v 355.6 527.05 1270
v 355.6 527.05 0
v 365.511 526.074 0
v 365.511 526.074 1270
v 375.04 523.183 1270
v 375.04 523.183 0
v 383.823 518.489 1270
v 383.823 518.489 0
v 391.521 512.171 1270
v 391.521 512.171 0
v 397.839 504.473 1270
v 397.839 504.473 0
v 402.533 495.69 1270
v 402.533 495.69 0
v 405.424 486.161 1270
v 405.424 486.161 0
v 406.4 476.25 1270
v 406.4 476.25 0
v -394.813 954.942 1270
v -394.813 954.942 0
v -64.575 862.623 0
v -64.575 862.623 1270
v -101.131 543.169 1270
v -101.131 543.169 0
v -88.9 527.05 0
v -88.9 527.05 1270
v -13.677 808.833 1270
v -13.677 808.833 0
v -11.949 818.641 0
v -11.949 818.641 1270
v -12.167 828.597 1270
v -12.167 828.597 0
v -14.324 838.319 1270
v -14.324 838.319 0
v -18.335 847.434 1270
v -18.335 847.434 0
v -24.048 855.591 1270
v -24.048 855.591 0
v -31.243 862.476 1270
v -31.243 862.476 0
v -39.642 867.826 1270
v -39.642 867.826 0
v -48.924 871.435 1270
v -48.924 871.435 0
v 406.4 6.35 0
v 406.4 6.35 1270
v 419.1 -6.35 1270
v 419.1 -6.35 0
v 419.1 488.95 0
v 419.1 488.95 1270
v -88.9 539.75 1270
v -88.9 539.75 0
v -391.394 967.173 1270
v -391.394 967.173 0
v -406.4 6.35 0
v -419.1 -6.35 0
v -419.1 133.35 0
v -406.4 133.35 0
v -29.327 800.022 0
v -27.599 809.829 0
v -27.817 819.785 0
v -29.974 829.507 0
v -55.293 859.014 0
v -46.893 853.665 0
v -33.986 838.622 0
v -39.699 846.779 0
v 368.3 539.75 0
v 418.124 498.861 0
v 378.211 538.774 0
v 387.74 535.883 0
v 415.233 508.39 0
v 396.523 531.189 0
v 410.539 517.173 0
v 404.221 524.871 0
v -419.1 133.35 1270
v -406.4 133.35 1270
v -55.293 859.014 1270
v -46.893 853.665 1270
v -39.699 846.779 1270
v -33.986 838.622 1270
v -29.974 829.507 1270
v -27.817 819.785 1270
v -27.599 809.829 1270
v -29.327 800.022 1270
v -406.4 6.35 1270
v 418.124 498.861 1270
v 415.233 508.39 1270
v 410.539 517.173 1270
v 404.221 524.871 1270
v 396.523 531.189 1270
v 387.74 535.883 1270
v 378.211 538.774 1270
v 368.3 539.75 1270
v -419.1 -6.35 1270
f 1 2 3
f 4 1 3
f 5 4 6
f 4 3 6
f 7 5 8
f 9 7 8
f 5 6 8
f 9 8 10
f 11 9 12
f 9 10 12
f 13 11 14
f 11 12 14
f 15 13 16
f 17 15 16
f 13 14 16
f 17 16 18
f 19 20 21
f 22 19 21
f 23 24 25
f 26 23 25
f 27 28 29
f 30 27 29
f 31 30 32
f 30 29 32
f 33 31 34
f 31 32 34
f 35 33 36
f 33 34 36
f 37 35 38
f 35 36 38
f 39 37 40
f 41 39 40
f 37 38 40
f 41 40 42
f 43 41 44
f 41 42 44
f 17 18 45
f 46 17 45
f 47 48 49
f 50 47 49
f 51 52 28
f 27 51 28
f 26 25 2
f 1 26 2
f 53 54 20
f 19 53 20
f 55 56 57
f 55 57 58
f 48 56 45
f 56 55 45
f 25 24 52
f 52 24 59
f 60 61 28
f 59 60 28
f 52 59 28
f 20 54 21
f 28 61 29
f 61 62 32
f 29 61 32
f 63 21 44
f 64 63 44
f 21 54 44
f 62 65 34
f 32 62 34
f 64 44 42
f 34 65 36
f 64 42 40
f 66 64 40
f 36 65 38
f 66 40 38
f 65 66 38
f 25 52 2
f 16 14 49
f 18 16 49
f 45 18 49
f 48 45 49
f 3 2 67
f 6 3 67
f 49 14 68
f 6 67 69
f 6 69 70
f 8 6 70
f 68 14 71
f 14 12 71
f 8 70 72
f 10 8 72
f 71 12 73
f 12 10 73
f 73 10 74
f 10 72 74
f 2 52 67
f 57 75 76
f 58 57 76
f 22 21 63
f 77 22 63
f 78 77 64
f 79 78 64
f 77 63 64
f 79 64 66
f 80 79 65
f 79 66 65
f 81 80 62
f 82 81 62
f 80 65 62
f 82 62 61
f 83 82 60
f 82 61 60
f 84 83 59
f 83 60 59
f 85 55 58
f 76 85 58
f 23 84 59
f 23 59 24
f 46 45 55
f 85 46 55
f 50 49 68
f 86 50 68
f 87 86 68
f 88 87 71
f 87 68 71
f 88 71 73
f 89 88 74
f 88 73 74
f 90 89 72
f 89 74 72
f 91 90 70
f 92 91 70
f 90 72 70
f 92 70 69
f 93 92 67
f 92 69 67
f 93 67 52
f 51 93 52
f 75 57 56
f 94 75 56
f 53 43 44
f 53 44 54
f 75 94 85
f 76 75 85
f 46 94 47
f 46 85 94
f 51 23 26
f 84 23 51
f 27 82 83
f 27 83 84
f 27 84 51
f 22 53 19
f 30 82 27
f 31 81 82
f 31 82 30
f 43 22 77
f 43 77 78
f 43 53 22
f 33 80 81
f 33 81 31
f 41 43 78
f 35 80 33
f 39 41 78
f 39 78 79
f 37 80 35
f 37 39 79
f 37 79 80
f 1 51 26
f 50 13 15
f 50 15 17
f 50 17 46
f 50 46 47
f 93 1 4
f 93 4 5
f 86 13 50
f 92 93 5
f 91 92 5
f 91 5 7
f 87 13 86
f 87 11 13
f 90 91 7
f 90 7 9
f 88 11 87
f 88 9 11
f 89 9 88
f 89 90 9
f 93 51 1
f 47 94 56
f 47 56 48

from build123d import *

# Parameters (mm, degrees)
F0_W     = 12.7
F0_H     = 127
F1_DEPTH = 1270


with BuildPart() as f1:
    # F0 (on Top) → F1 (new body)
    with BuildSketch(Plane.XY):
        with Locations((-412.75, 69.85)):
            Rectangle(F0_W, F0_H)
        Polygon((-406.4, 6.35), (-419.1, 6.35), (-419.1, -6.35), (419.1, -6.35), (419.1, 6.35), (406.4, 6.35), align=None)
        with BuildLine():
            Line((406.4, 476.25), (406.4, 6.35))
            Line((406.4, 6.35), (419.1, 6.35))
            Line((419.1, 6.35), (419.1, 488.95))
            ThreePointArc((419.1, 488.95), (404.221024, 524.871024), (368.3, 539.75))
            Line((368.3, 539.75), (-88.9, 539.75))
            Line((-88.9, 539.75), (-13.676923, 808.833349))
            ThreePointArc((-13.676923, 808.833349), (-18.335458, 847.433893), (-48.924245, 871.434517))
            Line((-48.924245, 871.434517), (-391.393962, 967.172979))
            Line((-391.393962, 967.172979), (-394.813193, 954.941918))
            Line((-394.813193, 954.941918), (-64.574537, 862.622687))
            ThreePointArc((-64.574537, 862.622687), (-33.98575, 838.622062), (-29.327215, 800.021518))
            Line((-29.327215, 800.021518), (-101.131061, 543.169231))
            Line((-101.131061, 543.169231), (-88.9, 527.05))
            Line((-88.9, 527.05), (355.6, 527.05))
            ThreePointArc((355.6, 527.05), (391.521024, 512.171024), (406.4, 476.25))
        make_face()
    extrude(amount=F1_DEPTH)


solid = f1.part
